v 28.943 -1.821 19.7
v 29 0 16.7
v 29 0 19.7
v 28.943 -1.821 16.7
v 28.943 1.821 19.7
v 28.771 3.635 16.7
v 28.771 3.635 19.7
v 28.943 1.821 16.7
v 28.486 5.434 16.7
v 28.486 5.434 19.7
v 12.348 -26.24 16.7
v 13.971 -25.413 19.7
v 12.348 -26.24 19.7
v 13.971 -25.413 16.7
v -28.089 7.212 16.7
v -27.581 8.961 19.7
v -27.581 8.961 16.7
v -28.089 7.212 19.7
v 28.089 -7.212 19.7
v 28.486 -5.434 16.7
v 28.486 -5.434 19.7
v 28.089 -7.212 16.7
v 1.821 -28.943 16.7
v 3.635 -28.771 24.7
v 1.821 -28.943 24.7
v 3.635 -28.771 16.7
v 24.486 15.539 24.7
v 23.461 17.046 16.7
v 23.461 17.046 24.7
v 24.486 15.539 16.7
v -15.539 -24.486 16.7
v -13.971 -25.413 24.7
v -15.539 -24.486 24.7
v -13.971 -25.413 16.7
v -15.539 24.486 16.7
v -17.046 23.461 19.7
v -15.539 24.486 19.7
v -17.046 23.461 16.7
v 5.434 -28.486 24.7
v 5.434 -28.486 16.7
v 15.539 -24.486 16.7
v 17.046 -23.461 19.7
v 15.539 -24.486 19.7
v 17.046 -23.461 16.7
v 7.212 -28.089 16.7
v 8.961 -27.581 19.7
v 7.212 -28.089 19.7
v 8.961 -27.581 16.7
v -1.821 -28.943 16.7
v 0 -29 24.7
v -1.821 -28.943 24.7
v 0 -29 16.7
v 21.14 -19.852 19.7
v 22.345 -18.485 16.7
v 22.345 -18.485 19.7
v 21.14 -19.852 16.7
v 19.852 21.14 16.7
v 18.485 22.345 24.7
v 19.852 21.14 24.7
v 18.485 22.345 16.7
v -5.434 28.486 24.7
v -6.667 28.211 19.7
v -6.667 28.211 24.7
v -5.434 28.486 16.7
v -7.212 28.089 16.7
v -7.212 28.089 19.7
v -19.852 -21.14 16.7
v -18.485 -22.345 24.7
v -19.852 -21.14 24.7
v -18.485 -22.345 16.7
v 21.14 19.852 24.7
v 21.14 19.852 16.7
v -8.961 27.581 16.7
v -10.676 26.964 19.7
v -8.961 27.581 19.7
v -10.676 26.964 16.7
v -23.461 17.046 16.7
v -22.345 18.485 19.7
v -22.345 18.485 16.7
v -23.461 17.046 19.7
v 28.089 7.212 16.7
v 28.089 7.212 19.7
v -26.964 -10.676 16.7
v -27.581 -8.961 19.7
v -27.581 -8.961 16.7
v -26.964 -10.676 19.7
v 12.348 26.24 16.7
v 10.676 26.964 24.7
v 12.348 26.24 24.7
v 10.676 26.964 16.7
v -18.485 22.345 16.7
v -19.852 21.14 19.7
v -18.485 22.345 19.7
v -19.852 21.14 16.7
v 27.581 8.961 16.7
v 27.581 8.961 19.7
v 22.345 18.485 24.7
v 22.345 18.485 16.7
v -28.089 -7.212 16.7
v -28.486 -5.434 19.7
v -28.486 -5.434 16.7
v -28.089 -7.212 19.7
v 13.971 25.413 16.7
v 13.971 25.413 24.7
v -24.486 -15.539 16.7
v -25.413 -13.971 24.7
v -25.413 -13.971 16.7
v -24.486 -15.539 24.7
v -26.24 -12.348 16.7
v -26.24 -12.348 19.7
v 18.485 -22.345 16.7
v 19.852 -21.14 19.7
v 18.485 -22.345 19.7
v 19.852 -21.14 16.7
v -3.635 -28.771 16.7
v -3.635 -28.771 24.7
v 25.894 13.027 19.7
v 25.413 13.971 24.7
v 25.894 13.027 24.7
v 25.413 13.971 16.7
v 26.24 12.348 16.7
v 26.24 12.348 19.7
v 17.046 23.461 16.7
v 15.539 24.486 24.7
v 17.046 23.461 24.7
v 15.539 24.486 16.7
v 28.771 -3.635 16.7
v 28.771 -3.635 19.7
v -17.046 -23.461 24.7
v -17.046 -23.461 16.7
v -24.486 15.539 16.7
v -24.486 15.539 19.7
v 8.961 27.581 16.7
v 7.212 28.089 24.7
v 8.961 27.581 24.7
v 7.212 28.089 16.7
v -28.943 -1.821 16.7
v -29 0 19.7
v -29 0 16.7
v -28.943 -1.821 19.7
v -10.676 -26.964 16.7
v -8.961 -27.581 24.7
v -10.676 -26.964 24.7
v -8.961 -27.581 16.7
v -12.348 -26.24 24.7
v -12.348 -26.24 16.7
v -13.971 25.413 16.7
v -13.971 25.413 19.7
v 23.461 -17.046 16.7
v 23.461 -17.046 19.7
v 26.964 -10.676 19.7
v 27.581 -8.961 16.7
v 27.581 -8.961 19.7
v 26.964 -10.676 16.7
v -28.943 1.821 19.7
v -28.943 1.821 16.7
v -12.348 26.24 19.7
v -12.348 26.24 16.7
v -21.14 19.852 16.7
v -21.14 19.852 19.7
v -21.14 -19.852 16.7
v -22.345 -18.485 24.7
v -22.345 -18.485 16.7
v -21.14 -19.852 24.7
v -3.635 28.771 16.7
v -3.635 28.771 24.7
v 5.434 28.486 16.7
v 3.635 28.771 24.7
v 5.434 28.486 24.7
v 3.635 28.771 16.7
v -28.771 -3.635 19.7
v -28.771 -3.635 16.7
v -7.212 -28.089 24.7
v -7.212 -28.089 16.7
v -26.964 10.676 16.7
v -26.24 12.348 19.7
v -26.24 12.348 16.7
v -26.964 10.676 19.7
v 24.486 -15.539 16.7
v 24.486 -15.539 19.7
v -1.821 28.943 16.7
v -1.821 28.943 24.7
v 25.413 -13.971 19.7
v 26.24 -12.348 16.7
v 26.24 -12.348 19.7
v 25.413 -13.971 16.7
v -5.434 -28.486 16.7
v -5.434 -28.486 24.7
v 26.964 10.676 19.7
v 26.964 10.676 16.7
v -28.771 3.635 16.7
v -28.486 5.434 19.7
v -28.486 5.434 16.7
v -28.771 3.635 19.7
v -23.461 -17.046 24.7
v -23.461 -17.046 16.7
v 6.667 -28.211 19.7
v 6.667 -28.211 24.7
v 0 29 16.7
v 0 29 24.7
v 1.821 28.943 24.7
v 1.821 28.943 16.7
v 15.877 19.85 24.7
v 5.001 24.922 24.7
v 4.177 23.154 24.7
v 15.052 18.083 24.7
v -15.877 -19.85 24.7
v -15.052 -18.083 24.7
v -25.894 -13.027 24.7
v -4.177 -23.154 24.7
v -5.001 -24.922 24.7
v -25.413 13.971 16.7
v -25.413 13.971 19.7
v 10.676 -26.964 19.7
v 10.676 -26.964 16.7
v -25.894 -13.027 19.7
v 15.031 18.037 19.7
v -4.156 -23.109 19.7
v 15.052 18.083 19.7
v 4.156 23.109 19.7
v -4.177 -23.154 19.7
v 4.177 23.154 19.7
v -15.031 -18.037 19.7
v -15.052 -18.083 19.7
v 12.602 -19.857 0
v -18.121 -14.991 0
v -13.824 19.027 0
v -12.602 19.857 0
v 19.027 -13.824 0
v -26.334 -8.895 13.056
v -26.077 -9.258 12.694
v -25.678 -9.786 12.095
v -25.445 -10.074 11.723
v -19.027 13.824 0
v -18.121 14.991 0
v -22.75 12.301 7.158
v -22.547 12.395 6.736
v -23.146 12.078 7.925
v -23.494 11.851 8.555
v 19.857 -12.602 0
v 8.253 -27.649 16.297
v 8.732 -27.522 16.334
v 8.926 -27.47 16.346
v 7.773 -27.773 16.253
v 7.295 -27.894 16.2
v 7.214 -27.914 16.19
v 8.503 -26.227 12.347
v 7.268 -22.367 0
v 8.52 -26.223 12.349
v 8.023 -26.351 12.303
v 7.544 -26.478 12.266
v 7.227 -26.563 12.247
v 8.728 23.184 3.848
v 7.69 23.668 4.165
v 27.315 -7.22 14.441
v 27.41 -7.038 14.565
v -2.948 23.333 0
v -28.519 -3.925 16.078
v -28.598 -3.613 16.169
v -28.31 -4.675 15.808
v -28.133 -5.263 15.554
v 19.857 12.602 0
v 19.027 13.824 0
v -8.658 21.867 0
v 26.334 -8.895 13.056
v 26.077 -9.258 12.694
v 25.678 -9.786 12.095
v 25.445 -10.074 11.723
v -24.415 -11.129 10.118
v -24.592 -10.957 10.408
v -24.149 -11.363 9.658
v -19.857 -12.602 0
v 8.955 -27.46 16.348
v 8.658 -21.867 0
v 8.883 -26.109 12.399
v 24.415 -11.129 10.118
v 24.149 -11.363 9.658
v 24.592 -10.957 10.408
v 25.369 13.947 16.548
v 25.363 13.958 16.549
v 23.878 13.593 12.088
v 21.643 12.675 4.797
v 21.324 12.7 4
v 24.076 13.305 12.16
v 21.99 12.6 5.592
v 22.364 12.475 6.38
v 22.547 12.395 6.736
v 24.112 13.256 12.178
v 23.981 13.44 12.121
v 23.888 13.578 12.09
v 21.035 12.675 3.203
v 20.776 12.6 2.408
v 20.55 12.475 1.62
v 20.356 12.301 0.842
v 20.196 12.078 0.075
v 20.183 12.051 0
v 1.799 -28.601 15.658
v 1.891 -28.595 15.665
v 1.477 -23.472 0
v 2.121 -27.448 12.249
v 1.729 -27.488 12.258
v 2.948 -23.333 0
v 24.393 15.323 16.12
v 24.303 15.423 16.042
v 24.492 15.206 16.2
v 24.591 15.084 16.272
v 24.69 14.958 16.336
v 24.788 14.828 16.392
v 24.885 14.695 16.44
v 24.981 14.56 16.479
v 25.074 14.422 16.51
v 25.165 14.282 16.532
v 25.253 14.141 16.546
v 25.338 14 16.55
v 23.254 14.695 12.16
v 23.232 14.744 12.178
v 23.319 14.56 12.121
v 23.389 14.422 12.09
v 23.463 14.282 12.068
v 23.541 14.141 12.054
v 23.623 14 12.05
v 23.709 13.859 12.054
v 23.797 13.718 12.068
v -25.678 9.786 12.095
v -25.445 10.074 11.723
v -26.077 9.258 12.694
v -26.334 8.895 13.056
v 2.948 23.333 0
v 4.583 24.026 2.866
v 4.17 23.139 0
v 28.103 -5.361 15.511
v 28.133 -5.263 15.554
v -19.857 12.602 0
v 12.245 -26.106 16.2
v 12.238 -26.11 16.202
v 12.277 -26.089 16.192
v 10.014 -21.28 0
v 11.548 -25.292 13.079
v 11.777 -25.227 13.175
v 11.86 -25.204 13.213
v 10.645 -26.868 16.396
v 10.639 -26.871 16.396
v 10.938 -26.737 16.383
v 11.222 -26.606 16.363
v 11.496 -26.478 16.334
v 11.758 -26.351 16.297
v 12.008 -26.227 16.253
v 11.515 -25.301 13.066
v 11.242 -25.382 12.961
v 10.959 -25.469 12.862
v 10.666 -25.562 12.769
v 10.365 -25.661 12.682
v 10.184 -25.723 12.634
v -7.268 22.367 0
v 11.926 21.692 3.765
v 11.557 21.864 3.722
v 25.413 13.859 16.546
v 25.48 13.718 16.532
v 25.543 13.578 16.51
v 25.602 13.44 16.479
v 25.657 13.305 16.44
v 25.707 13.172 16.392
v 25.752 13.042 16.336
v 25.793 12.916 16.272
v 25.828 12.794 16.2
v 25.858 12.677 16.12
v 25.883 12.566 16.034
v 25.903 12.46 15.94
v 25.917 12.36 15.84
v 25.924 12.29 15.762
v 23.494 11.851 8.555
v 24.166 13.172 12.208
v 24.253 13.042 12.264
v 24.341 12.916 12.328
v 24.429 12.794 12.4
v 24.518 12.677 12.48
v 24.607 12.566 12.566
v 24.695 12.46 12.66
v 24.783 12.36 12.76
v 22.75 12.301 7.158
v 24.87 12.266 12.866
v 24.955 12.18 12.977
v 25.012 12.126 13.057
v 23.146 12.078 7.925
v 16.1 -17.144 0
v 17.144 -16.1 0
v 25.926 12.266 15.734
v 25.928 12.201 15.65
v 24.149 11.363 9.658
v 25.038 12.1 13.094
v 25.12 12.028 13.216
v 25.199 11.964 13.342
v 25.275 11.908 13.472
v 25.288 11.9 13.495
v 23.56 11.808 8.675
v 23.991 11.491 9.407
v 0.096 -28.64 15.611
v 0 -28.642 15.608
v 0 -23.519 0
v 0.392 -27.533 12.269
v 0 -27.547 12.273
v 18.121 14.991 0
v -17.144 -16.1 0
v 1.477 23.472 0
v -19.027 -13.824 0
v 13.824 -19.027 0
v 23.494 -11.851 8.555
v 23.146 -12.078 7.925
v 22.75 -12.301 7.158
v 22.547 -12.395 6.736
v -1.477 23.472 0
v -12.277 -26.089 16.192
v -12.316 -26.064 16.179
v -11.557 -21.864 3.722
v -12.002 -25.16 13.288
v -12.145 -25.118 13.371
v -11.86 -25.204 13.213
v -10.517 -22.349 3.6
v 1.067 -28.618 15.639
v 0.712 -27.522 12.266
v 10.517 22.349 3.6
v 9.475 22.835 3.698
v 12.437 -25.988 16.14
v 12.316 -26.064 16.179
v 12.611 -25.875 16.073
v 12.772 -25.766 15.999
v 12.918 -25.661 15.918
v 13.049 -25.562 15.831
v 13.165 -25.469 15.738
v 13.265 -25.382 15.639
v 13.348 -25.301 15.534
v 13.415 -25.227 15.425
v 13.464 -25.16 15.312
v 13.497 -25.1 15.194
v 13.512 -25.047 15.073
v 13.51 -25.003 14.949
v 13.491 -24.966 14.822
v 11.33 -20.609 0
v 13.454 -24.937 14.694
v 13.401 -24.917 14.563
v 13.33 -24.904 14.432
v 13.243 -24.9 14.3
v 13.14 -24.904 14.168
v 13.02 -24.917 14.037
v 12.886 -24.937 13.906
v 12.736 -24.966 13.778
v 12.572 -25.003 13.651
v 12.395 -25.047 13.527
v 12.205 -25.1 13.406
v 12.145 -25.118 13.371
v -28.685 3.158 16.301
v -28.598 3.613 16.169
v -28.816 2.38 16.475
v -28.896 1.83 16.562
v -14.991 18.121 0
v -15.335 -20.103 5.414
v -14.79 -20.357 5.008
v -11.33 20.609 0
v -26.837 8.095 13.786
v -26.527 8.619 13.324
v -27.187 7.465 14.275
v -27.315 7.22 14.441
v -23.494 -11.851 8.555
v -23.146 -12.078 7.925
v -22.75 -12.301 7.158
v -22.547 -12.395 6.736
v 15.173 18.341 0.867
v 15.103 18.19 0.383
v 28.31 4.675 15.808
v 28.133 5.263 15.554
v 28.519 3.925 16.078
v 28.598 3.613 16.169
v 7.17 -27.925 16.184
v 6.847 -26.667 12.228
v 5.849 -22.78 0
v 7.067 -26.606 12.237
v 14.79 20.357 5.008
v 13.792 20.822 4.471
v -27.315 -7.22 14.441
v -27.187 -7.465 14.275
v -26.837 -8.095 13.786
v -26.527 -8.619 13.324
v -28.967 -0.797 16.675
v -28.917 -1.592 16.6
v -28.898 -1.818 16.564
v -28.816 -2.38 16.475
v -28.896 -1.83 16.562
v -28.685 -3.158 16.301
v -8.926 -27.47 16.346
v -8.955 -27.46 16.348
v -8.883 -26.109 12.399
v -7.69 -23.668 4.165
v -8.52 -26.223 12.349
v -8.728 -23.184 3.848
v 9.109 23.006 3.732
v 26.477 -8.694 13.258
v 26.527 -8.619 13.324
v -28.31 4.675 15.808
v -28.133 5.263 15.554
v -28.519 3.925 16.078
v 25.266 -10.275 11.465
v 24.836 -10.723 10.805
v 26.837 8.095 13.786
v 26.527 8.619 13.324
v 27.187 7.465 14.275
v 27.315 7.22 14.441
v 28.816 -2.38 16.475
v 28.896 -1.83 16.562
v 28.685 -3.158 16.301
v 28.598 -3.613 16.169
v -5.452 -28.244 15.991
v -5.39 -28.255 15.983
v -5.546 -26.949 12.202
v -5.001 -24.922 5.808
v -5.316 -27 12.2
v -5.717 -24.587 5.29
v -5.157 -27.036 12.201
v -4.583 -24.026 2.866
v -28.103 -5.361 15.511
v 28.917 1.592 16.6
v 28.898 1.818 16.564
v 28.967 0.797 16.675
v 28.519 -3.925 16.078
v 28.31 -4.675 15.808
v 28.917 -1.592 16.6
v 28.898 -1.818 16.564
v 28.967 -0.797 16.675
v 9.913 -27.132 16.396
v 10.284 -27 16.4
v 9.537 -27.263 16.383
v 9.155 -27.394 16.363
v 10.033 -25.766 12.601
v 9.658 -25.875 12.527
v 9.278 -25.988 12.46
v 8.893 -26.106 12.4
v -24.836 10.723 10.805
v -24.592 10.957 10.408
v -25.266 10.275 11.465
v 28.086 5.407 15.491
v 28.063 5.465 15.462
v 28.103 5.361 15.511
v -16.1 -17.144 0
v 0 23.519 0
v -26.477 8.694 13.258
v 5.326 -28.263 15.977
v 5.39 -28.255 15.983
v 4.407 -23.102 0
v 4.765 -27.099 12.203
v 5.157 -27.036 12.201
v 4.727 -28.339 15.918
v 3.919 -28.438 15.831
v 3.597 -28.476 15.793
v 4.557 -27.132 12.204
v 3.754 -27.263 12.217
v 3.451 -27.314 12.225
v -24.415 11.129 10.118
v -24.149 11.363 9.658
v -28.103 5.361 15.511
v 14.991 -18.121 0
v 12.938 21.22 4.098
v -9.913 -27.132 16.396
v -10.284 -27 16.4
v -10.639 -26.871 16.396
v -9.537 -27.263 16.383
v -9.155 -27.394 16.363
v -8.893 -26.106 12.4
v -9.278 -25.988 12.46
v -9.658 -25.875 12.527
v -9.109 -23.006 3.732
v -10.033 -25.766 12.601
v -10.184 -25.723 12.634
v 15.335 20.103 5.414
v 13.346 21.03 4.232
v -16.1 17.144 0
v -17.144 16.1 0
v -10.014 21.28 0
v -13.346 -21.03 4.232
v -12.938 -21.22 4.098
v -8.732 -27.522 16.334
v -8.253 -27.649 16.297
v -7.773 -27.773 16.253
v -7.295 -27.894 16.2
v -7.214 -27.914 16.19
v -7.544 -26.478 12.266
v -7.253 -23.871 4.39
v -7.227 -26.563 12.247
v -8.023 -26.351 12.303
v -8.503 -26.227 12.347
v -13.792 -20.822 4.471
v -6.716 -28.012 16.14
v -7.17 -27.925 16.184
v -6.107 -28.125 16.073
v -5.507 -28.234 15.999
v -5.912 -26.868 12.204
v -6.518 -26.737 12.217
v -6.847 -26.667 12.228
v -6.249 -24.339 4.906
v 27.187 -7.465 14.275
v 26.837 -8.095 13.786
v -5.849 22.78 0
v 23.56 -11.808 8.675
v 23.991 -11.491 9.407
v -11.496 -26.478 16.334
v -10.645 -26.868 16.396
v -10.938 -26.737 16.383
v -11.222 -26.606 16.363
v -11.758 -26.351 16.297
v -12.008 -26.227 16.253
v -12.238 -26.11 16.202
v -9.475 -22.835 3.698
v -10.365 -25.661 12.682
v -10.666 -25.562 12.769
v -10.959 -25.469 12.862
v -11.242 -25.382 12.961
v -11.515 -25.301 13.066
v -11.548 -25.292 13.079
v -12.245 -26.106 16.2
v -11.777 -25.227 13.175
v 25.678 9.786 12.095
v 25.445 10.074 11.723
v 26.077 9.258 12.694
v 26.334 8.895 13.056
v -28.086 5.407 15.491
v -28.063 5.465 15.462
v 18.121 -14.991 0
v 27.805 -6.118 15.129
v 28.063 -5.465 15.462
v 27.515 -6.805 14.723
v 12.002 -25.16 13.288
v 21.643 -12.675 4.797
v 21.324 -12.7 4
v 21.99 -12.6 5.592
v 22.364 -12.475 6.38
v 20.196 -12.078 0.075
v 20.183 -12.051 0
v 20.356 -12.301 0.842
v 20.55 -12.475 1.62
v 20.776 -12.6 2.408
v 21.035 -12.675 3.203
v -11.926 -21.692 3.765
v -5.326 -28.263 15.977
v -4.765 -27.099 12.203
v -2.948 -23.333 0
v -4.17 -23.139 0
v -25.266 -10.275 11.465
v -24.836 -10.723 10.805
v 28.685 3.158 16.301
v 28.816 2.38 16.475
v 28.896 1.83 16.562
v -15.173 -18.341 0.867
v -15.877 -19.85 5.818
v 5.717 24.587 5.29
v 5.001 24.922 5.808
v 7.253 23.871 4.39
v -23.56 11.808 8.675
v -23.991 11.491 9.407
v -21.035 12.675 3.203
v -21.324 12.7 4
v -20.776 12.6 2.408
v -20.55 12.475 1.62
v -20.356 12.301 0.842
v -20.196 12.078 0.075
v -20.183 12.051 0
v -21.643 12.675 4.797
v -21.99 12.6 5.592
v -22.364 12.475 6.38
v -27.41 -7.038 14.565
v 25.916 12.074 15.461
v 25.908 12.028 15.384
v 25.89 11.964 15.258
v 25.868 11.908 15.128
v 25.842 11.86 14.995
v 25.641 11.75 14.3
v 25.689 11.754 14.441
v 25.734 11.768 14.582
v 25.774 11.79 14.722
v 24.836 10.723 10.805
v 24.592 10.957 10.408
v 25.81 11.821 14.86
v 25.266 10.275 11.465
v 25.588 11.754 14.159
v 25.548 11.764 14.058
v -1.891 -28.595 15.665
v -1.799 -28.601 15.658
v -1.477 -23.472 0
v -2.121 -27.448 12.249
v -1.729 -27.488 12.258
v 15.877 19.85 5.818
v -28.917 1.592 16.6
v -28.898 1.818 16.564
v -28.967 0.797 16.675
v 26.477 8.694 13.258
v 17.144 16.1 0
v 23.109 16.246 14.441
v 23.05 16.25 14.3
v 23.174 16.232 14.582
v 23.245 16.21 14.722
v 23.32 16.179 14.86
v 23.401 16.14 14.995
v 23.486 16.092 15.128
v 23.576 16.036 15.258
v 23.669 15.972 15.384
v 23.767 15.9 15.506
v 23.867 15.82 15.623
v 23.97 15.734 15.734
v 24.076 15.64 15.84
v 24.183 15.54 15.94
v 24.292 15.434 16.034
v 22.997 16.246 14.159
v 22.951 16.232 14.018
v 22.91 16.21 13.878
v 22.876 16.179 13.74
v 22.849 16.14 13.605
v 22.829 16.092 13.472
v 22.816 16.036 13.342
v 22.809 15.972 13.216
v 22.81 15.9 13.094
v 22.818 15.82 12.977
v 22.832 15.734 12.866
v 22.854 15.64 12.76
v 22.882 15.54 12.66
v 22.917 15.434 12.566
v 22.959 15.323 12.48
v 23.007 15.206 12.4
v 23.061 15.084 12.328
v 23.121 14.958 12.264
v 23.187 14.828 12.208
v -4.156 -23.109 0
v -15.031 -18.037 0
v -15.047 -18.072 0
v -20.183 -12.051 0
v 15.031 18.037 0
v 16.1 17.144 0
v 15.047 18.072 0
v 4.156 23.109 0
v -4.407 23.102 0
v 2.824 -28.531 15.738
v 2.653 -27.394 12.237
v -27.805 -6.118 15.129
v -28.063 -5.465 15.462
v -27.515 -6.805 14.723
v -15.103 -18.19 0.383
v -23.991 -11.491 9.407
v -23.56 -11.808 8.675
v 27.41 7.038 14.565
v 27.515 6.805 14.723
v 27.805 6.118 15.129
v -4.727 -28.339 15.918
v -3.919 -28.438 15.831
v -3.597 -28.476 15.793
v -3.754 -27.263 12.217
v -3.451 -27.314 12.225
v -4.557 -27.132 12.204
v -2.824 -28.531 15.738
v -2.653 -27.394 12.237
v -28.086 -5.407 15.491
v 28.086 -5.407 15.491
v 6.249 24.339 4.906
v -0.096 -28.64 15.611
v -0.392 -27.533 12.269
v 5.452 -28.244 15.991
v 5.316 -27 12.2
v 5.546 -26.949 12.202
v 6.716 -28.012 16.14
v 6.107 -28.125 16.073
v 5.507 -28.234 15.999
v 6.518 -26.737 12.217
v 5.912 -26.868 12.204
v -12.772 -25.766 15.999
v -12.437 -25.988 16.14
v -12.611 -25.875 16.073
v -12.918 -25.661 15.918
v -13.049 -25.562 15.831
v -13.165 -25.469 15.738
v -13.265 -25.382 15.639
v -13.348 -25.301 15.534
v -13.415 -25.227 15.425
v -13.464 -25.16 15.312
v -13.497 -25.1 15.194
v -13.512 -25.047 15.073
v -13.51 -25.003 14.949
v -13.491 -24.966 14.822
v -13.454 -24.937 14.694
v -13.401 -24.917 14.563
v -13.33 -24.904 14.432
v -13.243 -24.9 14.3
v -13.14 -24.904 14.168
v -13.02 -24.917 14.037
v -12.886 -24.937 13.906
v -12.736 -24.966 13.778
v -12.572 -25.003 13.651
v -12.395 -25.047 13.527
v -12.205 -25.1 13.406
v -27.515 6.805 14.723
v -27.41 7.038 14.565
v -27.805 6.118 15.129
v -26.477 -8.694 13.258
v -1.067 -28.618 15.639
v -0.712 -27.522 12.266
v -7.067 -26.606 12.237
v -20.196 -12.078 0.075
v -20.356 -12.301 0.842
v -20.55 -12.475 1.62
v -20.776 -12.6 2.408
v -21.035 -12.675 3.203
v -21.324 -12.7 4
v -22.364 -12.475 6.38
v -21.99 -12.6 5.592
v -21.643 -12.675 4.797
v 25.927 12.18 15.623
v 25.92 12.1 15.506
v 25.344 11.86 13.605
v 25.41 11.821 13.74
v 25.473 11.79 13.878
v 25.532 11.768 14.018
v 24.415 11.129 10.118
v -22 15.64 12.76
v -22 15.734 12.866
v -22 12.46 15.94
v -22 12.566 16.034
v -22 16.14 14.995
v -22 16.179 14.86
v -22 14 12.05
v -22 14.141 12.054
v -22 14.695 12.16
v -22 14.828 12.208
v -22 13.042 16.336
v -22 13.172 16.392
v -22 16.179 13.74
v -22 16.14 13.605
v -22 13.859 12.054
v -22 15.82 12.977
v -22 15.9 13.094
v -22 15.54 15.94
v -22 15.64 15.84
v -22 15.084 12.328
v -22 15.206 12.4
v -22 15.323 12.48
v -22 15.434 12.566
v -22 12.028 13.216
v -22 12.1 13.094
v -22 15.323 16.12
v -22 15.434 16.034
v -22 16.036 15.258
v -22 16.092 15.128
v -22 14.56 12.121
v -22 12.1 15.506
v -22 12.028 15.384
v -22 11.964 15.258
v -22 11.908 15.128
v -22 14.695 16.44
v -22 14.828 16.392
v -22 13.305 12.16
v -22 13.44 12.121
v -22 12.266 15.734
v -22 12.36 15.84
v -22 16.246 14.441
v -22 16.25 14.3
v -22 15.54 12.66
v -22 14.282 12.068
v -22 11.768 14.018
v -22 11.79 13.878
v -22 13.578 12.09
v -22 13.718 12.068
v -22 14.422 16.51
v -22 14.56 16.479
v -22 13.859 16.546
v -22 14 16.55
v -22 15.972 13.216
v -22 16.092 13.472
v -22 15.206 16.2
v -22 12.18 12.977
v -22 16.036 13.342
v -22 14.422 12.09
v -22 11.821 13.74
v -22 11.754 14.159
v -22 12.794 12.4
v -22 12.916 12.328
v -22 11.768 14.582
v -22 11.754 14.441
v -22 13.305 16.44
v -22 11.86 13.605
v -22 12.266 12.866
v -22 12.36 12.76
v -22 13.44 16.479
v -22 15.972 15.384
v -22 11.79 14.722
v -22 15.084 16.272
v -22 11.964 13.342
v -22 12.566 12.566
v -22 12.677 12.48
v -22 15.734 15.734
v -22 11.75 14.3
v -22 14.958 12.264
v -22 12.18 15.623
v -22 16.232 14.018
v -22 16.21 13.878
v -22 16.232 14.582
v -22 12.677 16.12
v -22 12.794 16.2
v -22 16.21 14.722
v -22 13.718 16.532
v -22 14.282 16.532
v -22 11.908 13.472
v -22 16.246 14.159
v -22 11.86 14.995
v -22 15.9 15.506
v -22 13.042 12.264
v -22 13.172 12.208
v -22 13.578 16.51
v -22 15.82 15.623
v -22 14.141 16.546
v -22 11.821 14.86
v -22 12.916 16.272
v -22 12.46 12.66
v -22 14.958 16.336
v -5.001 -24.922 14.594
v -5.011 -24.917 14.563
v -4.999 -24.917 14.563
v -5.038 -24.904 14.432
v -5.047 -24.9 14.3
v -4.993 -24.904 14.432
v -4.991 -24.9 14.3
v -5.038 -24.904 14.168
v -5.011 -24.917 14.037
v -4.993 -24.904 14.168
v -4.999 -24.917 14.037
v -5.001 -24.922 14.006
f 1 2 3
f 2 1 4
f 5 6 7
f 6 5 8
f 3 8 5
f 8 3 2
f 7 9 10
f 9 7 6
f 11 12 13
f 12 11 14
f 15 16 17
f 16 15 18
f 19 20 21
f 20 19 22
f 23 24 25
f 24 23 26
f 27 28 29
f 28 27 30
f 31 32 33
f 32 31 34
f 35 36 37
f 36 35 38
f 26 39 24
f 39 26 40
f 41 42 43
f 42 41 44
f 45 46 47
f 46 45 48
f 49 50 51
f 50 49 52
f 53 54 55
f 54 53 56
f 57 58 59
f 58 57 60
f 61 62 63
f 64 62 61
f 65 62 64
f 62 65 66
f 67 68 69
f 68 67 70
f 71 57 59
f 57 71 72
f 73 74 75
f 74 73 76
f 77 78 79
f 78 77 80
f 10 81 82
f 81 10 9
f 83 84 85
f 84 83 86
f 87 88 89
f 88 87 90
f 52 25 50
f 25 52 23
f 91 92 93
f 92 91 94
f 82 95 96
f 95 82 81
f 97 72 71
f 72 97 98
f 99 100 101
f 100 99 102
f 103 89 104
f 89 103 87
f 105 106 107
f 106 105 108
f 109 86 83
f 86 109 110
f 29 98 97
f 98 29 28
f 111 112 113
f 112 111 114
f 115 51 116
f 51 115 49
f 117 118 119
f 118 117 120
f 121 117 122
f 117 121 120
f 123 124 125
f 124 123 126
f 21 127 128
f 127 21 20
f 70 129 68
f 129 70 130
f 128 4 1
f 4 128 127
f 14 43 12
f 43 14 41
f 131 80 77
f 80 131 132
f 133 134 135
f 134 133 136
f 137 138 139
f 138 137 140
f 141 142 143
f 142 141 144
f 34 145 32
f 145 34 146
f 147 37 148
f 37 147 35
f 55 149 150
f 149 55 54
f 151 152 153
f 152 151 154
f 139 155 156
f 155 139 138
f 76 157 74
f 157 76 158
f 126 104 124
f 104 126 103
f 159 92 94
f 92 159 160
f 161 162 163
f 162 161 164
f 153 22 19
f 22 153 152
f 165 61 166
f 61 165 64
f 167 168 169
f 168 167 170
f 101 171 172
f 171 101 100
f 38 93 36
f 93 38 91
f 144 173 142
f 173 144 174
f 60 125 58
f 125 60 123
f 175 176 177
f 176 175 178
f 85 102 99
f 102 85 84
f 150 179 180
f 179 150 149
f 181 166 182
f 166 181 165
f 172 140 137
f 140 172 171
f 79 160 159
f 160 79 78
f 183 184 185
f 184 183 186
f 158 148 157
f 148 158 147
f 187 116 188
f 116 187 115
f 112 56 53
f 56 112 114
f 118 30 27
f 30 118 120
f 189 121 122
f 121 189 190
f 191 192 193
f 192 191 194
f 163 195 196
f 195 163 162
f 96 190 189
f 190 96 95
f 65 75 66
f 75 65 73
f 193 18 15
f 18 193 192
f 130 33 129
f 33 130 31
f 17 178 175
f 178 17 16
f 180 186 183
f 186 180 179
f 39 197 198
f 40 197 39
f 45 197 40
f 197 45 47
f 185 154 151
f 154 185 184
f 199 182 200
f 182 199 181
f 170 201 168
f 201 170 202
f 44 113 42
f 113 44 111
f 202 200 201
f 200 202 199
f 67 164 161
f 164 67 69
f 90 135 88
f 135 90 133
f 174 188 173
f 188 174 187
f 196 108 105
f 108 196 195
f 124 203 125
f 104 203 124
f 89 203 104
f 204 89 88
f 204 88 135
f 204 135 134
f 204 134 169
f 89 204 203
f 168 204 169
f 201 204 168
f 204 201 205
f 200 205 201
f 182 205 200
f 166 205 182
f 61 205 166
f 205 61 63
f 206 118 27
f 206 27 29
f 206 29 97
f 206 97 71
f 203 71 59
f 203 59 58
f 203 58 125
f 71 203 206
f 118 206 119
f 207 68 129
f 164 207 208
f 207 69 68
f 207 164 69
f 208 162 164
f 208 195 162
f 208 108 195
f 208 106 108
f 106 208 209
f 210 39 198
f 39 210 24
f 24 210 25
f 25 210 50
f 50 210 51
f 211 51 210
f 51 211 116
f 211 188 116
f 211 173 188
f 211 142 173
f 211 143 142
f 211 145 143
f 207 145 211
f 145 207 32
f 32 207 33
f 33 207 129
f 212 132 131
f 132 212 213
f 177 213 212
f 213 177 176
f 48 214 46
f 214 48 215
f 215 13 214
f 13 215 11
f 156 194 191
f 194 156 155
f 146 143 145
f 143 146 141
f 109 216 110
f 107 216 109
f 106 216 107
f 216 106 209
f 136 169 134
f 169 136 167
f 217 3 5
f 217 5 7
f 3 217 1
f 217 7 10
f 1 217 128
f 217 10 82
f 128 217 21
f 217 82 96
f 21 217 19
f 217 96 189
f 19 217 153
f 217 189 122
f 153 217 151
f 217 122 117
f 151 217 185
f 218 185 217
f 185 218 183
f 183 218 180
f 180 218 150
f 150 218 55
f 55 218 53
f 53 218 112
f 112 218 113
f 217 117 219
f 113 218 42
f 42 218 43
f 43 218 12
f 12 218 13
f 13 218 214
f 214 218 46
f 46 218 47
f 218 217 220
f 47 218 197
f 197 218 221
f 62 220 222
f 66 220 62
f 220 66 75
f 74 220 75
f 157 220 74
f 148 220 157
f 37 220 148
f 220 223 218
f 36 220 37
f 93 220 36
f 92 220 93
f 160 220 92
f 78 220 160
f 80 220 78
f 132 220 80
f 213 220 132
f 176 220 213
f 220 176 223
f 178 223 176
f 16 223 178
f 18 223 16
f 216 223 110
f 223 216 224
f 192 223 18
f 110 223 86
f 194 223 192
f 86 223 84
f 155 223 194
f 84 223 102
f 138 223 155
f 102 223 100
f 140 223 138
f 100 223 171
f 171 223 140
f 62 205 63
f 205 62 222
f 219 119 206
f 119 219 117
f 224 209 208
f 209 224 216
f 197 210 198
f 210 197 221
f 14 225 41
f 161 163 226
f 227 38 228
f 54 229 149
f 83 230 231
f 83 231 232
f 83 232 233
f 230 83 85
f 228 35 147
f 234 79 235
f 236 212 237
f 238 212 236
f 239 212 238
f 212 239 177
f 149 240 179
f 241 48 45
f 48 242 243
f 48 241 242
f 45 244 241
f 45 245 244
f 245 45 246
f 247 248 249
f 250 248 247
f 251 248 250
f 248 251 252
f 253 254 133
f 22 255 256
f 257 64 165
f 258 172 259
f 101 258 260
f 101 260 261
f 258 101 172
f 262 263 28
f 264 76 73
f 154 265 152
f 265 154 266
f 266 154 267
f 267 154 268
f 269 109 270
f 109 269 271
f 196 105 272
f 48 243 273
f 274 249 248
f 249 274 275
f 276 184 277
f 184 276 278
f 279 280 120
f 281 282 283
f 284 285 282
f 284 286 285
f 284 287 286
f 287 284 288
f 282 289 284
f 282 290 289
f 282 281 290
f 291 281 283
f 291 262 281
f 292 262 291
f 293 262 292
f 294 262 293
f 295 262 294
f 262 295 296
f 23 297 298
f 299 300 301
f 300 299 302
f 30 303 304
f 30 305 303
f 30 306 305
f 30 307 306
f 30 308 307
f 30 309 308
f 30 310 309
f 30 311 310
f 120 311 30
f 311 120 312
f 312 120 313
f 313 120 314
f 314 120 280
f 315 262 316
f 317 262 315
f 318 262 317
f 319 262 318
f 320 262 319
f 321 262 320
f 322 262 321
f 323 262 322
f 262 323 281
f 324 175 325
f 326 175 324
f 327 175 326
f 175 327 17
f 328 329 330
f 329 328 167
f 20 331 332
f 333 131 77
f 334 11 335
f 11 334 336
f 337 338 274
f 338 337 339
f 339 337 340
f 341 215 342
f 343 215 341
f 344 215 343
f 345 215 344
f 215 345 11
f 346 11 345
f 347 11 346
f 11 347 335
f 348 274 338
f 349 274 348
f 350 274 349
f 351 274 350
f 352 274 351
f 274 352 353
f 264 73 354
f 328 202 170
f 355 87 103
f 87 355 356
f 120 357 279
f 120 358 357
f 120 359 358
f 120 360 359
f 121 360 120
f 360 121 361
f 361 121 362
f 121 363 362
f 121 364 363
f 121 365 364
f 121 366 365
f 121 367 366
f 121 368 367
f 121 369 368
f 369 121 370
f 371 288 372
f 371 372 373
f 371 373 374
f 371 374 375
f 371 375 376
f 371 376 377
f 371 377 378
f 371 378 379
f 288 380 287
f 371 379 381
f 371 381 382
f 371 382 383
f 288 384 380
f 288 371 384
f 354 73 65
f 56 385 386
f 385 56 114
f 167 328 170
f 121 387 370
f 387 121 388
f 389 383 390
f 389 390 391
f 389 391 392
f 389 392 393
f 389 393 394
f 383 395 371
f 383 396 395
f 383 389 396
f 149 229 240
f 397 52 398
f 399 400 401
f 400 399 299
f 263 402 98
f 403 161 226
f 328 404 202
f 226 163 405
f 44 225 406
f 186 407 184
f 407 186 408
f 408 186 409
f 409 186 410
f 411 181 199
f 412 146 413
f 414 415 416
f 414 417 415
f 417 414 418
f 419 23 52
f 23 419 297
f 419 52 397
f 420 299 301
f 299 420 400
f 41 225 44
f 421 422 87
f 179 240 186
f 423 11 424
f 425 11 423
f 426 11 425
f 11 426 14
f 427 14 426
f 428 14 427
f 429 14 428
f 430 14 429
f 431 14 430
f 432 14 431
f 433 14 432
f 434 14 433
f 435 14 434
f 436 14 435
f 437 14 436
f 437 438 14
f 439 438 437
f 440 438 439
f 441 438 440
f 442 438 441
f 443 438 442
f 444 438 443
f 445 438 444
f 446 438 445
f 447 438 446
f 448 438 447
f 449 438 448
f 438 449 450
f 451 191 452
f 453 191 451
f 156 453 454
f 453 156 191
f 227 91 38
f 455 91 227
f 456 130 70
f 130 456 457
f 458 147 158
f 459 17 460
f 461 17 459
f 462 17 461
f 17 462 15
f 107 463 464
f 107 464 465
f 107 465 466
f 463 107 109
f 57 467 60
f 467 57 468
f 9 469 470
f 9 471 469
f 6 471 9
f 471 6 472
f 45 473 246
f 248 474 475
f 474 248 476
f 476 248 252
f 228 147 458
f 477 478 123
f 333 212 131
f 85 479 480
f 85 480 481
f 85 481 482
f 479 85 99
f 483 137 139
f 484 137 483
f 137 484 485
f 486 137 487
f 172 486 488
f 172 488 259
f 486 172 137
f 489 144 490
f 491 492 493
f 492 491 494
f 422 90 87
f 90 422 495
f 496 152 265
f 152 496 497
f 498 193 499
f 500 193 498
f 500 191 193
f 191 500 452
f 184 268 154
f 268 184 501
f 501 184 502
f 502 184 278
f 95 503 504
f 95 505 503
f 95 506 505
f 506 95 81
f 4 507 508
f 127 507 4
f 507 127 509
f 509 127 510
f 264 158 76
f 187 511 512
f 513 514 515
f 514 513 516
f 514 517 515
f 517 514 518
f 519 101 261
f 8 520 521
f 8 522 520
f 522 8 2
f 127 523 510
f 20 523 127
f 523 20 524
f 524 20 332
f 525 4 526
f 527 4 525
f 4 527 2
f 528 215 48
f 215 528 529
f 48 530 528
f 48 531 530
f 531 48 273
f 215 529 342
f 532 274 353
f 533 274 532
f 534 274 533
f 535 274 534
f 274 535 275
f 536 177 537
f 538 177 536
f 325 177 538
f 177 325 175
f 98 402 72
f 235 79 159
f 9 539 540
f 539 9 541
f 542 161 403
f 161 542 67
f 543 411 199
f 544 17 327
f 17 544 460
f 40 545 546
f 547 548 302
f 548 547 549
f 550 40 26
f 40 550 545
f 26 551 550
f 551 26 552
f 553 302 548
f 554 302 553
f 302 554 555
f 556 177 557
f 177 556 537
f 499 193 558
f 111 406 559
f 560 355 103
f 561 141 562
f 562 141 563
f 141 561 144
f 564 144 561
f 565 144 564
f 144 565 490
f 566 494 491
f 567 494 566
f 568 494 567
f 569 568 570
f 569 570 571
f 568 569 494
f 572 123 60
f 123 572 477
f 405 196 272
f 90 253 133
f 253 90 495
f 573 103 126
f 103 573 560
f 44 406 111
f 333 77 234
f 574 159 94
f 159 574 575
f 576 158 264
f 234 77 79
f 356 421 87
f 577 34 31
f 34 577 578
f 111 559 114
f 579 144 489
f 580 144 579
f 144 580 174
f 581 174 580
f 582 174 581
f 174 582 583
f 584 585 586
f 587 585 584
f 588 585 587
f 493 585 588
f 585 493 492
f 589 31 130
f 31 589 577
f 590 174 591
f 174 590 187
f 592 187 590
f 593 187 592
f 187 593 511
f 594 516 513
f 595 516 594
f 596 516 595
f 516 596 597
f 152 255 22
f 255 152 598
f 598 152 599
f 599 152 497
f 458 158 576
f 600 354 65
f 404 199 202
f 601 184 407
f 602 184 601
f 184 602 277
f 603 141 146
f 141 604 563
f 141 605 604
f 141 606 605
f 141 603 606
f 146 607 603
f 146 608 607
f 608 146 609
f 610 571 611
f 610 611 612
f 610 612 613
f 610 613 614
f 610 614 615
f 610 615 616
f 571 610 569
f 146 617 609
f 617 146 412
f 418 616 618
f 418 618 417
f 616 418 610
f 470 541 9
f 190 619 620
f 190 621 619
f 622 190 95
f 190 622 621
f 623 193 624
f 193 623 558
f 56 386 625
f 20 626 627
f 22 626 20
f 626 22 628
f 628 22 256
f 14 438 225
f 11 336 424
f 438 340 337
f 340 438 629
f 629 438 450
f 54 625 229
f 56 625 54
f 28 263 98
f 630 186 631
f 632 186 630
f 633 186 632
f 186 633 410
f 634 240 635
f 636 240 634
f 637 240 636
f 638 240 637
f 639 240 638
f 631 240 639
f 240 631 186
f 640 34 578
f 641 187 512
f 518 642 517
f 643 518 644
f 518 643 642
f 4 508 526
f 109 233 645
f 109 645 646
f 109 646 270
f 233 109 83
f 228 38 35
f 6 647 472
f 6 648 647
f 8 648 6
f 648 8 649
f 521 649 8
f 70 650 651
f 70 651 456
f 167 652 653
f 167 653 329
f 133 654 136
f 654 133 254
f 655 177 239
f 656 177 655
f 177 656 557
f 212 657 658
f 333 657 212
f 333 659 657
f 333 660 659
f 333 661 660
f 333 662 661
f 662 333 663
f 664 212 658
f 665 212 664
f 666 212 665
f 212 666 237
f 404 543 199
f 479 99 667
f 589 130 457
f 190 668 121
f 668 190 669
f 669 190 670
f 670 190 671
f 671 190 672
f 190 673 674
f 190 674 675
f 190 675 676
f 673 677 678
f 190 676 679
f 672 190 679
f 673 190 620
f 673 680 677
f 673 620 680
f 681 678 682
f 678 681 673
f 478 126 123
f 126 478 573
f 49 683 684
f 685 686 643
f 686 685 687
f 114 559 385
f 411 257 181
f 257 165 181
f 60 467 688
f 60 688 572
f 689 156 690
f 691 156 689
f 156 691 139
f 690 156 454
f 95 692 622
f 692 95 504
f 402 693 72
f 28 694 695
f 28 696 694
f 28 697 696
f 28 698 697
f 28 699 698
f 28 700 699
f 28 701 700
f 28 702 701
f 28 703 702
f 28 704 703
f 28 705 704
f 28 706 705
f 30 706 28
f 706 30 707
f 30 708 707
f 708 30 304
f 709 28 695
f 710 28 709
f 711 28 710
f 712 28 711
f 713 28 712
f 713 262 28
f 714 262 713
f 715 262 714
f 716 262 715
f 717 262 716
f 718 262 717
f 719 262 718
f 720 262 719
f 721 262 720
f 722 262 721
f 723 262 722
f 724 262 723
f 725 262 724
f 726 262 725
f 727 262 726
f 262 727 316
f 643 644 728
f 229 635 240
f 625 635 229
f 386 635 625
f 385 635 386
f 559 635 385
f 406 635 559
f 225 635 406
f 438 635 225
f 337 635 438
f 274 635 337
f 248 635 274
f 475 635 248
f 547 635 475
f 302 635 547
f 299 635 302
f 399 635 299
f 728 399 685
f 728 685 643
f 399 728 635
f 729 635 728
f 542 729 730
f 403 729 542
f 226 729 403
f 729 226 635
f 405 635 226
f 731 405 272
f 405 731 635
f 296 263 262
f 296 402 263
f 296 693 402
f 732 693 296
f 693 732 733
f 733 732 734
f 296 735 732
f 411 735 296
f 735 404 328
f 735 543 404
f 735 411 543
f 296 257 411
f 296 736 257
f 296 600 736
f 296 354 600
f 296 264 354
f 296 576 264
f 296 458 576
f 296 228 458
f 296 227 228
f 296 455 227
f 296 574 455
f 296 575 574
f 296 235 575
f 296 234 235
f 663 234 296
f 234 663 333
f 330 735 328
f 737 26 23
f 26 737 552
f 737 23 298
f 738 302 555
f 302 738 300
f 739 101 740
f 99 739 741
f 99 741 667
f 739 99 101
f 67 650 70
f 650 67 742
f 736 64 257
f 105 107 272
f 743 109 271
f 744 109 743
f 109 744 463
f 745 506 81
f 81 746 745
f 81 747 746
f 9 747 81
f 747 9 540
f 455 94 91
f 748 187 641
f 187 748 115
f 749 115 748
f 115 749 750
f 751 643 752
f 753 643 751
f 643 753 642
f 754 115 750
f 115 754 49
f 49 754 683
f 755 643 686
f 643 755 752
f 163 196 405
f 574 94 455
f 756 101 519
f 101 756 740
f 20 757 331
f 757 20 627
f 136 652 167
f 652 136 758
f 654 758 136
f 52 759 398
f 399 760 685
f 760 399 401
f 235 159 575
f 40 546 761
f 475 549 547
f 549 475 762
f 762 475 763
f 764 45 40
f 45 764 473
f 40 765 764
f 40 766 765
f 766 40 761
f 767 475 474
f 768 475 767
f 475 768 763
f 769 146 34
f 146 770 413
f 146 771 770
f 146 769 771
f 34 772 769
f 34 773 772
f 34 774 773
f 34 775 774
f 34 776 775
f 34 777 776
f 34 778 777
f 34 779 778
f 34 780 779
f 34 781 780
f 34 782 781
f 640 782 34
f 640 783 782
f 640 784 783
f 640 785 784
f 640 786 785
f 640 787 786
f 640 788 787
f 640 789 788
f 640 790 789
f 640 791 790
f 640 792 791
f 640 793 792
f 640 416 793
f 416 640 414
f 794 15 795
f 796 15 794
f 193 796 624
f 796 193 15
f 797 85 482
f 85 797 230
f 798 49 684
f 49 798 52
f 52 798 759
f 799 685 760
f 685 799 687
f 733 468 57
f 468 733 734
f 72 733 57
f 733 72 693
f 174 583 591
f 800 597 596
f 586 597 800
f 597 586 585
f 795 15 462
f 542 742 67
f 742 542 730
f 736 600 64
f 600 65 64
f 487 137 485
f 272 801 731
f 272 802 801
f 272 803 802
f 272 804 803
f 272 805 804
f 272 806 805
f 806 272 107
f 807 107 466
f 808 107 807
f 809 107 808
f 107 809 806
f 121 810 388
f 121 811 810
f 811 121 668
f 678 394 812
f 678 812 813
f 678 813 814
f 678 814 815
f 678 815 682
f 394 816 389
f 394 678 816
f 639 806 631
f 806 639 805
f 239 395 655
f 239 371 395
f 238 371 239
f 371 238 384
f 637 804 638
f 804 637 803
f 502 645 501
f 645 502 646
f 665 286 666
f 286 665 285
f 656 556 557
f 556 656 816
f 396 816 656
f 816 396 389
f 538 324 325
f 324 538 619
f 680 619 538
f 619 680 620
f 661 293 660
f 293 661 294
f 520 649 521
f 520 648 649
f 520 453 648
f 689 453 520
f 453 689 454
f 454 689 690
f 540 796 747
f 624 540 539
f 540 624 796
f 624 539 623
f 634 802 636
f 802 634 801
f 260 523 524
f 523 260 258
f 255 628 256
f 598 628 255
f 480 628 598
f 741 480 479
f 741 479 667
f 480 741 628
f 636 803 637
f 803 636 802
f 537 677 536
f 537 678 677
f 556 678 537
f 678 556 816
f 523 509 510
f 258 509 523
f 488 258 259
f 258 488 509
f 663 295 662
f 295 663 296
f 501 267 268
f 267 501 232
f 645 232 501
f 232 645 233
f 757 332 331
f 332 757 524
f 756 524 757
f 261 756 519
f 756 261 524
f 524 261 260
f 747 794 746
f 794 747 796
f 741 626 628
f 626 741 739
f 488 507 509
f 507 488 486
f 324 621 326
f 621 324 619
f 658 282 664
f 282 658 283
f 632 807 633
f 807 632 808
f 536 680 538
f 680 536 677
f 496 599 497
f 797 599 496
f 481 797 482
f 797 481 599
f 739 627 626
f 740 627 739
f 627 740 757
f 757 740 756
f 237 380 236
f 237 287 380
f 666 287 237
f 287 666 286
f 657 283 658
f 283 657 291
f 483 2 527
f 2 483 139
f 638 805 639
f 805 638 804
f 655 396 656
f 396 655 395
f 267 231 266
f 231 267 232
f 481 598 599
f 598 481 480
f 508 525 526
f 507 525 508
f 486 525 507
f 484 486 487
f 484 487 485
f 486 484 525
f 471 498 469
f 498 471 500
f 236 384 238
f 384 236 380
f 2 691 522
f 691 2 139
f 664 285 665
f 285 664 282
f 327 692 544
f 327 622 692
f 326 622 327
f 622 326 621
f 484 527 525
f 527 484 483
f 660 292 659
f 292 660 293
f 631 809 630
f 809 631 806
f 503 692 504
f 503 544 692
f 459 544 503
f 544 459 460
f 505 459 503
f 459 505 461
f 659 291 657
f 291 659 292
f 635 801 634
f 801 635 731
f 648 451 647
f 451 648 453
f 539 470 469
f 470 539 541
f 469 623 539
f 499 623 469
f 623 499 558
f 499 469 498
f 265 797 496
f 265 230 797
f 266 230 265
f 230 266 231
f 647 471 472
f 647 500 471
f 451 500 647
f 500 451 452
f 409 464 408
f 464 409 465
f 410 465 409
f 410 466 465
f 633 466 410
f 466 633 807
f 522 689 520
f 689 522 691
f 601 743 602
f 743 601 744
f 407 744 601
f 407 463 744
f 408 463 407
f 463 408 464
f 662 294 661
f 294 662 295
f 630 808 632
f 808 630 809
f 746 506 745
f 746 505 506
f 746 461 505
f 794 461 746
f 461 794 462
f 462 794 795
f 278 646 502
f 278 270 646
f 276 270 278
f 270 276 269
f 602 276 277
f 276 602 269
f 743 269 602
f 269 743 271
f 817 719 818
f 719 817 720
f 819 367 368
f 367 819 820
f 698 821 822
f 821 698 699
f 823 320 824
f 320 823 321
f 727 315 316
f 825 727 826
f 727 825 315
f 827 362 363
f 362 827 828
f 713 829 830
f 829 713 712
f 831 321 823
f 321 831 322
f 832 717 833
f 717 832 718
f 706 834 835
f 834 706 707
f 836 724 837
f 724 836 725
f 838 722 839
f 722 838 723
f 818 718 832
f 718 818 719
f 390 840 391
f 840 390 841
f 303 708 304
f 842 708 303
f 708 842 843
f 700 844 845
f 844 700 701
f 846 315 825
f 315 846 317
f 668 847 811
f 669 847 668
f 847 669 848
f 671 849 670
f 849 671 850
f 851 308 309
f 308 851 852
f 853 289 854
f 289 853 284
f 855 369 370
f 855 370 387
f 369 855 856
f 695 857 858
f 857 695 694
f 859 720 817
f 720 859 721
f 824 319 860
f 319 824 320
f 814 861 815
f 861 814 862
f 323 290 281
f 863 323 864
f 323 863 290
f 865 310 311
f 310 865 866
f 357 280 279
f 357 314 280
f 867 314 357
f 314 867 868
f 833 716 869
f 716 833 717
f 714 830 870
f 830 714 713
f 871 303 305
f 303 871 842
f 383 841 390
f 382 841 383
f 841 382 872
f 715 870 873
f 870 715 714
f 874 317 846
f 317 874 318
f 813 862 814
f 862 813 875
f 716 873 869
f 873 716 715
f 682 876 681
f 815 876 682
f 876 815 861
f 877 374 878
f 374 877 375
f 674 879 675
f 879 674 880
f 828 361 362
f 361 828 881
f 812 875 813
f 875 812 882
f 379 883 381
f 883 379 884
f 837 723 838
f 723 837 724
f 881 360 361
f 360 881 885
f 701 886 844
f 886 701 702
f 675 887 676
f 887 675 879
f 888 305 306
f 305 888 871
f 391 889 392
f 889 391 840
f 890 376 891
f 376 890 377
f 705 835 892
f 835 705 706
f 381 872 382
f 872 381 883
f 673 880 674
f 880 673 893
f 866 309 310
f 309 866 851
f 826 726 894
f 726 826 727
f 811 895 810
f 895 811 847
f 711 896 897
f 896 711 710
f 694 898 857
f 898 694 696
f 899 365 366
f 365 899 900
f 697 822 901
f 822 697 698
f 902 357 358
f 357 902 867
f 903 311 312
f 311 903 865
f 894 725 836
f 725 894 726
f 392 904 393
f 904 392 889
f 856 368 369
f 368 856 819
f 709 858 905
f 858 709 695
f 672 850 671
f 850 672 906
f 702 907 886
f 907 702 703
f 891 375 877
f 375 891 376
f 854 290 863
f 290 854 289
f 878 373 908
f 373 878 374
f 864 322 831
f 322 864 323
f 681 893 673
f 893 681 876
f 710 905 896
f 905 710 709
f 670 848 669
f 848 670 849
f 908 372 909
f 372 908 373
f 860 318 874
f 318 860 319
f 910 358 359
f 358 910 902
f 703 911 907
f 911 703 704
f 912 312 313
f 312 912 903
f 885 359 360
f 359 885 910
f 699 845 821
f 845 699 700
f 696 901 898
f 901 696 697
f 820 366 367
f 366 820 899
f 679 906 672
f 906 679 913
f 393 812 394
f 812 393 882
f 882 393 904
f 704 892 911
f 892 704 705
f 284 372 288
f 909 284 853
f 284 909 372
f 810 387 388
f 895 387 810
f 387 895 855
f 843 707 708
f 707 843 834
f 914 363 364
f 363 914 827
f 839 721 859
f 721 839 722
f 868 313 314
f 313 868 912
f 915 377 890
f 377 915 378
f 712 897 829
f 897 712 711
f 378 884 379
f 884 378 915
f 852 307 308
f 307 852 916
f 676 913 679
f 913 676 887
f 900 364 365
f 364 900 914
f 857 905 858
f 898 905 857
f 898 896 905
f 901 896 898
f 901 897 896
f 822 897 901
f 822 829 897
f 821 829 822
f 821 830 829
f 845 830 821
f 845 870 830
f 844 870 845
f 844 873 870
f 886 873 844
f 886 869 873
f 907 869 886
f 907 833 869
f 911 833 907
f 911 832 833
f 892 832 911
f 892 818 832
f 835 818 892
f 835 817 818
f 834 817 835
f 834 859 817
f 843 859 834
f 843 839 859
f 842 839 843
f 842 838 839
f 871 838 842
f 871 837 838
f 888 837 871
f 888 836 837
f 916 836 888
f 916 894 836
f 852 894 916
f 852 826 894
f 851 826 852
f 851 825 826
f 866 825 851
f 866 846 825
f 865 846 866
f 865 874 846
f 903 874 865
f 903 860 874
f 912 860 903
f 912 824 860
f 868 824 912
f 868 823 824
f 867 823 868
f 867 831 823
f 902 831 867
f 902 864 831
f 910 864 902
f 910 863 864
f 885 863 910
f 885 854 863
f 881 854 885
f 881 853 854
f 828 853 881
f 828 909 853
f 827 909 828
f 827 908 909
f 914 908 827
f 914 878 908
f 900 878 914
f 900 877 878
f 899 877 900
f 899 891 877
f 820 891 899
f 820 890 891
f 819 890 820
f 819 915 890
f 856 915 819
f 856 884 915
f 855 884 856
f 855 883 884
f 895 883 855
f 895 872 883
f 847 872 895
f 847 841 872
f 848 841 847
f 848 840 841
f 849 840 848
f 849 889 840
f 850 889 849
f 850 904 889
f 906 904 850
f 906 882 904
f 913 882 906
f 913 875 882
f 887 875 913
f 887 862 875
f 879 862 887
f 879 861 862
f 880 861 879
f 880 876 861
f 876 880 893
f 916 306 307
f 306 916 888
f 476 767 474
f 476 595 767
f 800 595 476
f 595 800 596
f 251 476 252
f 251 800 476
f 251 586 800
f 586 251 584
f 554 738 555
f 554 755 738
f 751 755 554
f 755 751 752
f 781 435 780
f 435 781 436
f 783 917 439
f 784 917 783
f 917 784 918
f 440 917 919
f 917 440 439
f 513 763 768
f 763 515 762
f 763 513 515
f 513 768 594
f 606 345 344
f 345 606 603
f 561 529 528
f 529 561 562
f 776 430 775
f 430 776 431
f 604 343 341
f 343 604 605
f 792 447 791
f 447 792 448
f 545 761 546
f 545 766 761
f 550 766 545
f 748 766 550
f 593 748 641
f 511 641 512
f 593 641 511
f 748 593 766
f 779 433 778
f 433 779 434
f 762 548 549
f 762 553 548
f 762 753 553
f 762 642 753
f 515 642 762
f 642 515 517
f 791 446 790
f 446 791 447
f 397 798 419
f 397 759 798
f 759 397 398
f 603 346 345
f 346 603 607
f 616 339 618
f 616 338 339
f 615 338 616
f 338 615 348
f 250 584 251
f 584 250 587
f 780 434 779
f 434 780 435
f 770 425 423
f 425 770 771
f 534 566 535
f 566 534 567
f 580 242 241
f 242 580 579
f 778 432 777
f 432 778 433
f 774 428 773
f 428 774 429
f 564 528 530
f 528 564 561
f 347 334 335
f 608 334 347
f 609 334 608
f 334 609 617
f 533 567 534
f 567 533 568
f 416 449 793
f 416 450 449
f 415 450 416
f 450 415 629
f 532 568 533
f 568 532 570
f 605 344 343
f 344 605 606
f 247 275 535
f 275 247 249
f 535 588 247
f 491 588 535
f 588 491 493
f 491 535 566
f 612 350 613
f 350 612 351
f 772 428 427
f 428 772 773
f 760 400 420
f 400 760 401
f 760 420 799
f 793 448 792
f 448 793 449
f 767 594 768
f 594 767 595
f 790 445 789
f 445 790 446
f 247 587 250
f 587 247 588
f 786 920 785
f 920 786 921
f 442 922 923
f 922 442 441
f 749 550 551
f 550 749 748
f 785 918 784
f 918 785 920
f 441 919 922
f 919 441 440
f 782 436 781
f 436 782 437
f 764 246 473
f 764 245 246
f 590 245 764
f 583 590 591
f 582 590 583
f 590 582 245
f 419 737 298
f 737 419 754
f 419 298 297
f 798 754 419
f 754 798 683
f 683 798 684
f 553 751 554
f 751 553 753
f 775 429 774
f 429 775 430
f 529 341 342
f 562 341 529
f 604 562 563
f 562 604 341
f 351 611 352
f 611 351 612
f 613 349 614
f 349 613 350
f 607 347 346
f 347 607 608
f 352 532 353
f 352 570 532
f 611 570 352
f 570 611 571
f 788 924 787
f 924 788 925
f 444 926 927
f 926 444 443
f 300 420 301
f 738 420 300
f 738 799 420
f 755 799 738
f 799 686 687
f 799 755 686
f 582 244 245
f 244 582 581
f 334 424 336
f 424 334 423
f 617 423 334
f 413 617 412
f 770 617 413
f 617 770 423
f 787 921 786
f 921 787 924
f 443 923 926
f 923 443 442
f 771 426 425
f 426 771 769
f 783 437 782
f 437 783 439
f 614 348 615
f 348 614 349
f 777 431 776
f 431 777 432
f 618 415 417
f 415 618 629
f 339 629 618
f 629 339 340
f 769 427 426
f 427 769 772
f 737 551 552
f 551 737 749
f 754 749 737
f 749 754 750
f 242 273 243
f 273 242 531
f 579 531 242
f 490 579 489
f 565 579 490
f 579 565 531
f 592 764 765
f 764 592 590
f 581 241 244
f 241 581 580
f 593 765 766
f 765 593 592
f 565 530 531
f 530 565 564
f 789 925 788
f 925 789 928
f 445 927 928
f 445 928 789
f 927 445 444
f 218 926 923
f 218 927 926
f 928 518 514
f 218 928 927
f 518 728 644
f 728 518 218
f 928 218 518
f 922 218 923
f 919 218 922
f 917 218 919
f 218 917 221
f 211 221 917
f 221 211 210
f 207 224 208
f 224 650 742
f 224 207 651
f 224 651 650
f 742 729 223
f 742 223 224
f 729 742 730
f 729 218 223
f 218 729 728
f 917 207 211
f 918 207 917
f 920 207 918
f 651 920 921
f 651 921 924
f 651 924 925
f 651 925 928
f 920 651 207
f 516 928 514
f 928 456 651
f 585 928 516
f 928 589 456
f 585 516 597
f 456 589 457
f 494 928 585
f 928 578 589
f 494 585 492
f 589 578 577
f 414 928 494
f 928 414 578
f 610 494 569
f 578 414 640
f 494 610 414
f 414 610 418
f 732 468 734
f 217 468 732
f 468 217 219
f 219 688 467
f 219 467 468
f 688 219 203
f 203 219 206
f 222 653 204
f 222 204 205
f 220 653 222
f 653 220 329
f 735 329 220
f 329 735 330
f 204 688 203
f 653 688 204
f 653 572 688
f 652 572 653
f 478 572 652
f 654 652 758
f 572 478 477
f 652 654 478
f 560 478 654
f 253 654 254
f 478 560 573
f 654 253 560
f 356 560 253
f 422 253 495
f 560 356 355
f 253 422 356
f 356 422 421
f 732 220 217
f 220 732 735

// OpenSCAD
/*
Adapter from Glide-Cam-3000 to Tascam pre-amp
*/

glidecam_pole_diameter = 25.4;
glidecam_pole_radius = glidecam_pole_diameter/2;
$fn = 100;
platform_diameter = 58;
platform_radius = platform_diameter/2;

slit_width = 2;
slit_height = 12;
tascam_width = 45.5;

cable_pipe_diameter = 4.5;
cable_pipe_radius = cable_pipe_diameter/2;

cable_diameter_tascam = 4.2;

difference() {
    union() {
        difference() {
            translate([0, 0, glidecam_pole_radius + 4]) {
                cylinder(h=8, d1=platform_diameter, d2=platform_diameter);
            };
            rotate([0, 0, -25]) {
                translate([
                    -50,
                    -tascam_width/2,
                    glidecam_pole_radius + 3 + 4])
                {
                    cube([100, tascam_width, 10]);
                }
            }
        }
        difference() {
            cylinder(
                h=glidecam_pole_radius + 4,
                r1=glidecam_pole_diameter/1.08,
                r2=platform_radius,
                center=false
            );
            /* glide-cam-pole */
            translate([-50, 0, +4]) {
                rotate([0, 90, 0]) {
                    cylinder(
                        h=100,
                        d1=glidecam_pole_diameter,
                        d2=glidecam_pole_diameter,
                        center=false);
                };
            };
            /* cable-pipe-hole */
            translate([-22, 14, 14.3]) {
                rotate([0, 90, 0]) {
                    cylinder(
                        h=100,
                        d1=cable_pipe_diameter,
                        d2=cable_pipe_diameter,
                        center=false);
                };
            };
            /* tascam-cable-clip */
            translate([-50, -27.0, 14.3]) {
                rotate([0, 90, 0]) {
                    cylinder(
                        h=100,
                        d1=cable_diameter_tascam,
                        d2=cable_diameter_tascam,
                        center=false);
                };
            };
        }
    }
    rotate([0,0,-25]) {
        translate([
            -slit_height/2,
            -slit_width/2 -platform_radius + 5.3,
            -50])
        {
            cube([slit_height, slit_width, 100]);
        }
    }
    rotate([0,0,-25]) {
        translate([
            -slit_height/2,
            -slit_width/2 +platform_radius - 5.3,
            -50])
        {
            cube([slit_height, slit_width, 100]);
        }
    }
}
